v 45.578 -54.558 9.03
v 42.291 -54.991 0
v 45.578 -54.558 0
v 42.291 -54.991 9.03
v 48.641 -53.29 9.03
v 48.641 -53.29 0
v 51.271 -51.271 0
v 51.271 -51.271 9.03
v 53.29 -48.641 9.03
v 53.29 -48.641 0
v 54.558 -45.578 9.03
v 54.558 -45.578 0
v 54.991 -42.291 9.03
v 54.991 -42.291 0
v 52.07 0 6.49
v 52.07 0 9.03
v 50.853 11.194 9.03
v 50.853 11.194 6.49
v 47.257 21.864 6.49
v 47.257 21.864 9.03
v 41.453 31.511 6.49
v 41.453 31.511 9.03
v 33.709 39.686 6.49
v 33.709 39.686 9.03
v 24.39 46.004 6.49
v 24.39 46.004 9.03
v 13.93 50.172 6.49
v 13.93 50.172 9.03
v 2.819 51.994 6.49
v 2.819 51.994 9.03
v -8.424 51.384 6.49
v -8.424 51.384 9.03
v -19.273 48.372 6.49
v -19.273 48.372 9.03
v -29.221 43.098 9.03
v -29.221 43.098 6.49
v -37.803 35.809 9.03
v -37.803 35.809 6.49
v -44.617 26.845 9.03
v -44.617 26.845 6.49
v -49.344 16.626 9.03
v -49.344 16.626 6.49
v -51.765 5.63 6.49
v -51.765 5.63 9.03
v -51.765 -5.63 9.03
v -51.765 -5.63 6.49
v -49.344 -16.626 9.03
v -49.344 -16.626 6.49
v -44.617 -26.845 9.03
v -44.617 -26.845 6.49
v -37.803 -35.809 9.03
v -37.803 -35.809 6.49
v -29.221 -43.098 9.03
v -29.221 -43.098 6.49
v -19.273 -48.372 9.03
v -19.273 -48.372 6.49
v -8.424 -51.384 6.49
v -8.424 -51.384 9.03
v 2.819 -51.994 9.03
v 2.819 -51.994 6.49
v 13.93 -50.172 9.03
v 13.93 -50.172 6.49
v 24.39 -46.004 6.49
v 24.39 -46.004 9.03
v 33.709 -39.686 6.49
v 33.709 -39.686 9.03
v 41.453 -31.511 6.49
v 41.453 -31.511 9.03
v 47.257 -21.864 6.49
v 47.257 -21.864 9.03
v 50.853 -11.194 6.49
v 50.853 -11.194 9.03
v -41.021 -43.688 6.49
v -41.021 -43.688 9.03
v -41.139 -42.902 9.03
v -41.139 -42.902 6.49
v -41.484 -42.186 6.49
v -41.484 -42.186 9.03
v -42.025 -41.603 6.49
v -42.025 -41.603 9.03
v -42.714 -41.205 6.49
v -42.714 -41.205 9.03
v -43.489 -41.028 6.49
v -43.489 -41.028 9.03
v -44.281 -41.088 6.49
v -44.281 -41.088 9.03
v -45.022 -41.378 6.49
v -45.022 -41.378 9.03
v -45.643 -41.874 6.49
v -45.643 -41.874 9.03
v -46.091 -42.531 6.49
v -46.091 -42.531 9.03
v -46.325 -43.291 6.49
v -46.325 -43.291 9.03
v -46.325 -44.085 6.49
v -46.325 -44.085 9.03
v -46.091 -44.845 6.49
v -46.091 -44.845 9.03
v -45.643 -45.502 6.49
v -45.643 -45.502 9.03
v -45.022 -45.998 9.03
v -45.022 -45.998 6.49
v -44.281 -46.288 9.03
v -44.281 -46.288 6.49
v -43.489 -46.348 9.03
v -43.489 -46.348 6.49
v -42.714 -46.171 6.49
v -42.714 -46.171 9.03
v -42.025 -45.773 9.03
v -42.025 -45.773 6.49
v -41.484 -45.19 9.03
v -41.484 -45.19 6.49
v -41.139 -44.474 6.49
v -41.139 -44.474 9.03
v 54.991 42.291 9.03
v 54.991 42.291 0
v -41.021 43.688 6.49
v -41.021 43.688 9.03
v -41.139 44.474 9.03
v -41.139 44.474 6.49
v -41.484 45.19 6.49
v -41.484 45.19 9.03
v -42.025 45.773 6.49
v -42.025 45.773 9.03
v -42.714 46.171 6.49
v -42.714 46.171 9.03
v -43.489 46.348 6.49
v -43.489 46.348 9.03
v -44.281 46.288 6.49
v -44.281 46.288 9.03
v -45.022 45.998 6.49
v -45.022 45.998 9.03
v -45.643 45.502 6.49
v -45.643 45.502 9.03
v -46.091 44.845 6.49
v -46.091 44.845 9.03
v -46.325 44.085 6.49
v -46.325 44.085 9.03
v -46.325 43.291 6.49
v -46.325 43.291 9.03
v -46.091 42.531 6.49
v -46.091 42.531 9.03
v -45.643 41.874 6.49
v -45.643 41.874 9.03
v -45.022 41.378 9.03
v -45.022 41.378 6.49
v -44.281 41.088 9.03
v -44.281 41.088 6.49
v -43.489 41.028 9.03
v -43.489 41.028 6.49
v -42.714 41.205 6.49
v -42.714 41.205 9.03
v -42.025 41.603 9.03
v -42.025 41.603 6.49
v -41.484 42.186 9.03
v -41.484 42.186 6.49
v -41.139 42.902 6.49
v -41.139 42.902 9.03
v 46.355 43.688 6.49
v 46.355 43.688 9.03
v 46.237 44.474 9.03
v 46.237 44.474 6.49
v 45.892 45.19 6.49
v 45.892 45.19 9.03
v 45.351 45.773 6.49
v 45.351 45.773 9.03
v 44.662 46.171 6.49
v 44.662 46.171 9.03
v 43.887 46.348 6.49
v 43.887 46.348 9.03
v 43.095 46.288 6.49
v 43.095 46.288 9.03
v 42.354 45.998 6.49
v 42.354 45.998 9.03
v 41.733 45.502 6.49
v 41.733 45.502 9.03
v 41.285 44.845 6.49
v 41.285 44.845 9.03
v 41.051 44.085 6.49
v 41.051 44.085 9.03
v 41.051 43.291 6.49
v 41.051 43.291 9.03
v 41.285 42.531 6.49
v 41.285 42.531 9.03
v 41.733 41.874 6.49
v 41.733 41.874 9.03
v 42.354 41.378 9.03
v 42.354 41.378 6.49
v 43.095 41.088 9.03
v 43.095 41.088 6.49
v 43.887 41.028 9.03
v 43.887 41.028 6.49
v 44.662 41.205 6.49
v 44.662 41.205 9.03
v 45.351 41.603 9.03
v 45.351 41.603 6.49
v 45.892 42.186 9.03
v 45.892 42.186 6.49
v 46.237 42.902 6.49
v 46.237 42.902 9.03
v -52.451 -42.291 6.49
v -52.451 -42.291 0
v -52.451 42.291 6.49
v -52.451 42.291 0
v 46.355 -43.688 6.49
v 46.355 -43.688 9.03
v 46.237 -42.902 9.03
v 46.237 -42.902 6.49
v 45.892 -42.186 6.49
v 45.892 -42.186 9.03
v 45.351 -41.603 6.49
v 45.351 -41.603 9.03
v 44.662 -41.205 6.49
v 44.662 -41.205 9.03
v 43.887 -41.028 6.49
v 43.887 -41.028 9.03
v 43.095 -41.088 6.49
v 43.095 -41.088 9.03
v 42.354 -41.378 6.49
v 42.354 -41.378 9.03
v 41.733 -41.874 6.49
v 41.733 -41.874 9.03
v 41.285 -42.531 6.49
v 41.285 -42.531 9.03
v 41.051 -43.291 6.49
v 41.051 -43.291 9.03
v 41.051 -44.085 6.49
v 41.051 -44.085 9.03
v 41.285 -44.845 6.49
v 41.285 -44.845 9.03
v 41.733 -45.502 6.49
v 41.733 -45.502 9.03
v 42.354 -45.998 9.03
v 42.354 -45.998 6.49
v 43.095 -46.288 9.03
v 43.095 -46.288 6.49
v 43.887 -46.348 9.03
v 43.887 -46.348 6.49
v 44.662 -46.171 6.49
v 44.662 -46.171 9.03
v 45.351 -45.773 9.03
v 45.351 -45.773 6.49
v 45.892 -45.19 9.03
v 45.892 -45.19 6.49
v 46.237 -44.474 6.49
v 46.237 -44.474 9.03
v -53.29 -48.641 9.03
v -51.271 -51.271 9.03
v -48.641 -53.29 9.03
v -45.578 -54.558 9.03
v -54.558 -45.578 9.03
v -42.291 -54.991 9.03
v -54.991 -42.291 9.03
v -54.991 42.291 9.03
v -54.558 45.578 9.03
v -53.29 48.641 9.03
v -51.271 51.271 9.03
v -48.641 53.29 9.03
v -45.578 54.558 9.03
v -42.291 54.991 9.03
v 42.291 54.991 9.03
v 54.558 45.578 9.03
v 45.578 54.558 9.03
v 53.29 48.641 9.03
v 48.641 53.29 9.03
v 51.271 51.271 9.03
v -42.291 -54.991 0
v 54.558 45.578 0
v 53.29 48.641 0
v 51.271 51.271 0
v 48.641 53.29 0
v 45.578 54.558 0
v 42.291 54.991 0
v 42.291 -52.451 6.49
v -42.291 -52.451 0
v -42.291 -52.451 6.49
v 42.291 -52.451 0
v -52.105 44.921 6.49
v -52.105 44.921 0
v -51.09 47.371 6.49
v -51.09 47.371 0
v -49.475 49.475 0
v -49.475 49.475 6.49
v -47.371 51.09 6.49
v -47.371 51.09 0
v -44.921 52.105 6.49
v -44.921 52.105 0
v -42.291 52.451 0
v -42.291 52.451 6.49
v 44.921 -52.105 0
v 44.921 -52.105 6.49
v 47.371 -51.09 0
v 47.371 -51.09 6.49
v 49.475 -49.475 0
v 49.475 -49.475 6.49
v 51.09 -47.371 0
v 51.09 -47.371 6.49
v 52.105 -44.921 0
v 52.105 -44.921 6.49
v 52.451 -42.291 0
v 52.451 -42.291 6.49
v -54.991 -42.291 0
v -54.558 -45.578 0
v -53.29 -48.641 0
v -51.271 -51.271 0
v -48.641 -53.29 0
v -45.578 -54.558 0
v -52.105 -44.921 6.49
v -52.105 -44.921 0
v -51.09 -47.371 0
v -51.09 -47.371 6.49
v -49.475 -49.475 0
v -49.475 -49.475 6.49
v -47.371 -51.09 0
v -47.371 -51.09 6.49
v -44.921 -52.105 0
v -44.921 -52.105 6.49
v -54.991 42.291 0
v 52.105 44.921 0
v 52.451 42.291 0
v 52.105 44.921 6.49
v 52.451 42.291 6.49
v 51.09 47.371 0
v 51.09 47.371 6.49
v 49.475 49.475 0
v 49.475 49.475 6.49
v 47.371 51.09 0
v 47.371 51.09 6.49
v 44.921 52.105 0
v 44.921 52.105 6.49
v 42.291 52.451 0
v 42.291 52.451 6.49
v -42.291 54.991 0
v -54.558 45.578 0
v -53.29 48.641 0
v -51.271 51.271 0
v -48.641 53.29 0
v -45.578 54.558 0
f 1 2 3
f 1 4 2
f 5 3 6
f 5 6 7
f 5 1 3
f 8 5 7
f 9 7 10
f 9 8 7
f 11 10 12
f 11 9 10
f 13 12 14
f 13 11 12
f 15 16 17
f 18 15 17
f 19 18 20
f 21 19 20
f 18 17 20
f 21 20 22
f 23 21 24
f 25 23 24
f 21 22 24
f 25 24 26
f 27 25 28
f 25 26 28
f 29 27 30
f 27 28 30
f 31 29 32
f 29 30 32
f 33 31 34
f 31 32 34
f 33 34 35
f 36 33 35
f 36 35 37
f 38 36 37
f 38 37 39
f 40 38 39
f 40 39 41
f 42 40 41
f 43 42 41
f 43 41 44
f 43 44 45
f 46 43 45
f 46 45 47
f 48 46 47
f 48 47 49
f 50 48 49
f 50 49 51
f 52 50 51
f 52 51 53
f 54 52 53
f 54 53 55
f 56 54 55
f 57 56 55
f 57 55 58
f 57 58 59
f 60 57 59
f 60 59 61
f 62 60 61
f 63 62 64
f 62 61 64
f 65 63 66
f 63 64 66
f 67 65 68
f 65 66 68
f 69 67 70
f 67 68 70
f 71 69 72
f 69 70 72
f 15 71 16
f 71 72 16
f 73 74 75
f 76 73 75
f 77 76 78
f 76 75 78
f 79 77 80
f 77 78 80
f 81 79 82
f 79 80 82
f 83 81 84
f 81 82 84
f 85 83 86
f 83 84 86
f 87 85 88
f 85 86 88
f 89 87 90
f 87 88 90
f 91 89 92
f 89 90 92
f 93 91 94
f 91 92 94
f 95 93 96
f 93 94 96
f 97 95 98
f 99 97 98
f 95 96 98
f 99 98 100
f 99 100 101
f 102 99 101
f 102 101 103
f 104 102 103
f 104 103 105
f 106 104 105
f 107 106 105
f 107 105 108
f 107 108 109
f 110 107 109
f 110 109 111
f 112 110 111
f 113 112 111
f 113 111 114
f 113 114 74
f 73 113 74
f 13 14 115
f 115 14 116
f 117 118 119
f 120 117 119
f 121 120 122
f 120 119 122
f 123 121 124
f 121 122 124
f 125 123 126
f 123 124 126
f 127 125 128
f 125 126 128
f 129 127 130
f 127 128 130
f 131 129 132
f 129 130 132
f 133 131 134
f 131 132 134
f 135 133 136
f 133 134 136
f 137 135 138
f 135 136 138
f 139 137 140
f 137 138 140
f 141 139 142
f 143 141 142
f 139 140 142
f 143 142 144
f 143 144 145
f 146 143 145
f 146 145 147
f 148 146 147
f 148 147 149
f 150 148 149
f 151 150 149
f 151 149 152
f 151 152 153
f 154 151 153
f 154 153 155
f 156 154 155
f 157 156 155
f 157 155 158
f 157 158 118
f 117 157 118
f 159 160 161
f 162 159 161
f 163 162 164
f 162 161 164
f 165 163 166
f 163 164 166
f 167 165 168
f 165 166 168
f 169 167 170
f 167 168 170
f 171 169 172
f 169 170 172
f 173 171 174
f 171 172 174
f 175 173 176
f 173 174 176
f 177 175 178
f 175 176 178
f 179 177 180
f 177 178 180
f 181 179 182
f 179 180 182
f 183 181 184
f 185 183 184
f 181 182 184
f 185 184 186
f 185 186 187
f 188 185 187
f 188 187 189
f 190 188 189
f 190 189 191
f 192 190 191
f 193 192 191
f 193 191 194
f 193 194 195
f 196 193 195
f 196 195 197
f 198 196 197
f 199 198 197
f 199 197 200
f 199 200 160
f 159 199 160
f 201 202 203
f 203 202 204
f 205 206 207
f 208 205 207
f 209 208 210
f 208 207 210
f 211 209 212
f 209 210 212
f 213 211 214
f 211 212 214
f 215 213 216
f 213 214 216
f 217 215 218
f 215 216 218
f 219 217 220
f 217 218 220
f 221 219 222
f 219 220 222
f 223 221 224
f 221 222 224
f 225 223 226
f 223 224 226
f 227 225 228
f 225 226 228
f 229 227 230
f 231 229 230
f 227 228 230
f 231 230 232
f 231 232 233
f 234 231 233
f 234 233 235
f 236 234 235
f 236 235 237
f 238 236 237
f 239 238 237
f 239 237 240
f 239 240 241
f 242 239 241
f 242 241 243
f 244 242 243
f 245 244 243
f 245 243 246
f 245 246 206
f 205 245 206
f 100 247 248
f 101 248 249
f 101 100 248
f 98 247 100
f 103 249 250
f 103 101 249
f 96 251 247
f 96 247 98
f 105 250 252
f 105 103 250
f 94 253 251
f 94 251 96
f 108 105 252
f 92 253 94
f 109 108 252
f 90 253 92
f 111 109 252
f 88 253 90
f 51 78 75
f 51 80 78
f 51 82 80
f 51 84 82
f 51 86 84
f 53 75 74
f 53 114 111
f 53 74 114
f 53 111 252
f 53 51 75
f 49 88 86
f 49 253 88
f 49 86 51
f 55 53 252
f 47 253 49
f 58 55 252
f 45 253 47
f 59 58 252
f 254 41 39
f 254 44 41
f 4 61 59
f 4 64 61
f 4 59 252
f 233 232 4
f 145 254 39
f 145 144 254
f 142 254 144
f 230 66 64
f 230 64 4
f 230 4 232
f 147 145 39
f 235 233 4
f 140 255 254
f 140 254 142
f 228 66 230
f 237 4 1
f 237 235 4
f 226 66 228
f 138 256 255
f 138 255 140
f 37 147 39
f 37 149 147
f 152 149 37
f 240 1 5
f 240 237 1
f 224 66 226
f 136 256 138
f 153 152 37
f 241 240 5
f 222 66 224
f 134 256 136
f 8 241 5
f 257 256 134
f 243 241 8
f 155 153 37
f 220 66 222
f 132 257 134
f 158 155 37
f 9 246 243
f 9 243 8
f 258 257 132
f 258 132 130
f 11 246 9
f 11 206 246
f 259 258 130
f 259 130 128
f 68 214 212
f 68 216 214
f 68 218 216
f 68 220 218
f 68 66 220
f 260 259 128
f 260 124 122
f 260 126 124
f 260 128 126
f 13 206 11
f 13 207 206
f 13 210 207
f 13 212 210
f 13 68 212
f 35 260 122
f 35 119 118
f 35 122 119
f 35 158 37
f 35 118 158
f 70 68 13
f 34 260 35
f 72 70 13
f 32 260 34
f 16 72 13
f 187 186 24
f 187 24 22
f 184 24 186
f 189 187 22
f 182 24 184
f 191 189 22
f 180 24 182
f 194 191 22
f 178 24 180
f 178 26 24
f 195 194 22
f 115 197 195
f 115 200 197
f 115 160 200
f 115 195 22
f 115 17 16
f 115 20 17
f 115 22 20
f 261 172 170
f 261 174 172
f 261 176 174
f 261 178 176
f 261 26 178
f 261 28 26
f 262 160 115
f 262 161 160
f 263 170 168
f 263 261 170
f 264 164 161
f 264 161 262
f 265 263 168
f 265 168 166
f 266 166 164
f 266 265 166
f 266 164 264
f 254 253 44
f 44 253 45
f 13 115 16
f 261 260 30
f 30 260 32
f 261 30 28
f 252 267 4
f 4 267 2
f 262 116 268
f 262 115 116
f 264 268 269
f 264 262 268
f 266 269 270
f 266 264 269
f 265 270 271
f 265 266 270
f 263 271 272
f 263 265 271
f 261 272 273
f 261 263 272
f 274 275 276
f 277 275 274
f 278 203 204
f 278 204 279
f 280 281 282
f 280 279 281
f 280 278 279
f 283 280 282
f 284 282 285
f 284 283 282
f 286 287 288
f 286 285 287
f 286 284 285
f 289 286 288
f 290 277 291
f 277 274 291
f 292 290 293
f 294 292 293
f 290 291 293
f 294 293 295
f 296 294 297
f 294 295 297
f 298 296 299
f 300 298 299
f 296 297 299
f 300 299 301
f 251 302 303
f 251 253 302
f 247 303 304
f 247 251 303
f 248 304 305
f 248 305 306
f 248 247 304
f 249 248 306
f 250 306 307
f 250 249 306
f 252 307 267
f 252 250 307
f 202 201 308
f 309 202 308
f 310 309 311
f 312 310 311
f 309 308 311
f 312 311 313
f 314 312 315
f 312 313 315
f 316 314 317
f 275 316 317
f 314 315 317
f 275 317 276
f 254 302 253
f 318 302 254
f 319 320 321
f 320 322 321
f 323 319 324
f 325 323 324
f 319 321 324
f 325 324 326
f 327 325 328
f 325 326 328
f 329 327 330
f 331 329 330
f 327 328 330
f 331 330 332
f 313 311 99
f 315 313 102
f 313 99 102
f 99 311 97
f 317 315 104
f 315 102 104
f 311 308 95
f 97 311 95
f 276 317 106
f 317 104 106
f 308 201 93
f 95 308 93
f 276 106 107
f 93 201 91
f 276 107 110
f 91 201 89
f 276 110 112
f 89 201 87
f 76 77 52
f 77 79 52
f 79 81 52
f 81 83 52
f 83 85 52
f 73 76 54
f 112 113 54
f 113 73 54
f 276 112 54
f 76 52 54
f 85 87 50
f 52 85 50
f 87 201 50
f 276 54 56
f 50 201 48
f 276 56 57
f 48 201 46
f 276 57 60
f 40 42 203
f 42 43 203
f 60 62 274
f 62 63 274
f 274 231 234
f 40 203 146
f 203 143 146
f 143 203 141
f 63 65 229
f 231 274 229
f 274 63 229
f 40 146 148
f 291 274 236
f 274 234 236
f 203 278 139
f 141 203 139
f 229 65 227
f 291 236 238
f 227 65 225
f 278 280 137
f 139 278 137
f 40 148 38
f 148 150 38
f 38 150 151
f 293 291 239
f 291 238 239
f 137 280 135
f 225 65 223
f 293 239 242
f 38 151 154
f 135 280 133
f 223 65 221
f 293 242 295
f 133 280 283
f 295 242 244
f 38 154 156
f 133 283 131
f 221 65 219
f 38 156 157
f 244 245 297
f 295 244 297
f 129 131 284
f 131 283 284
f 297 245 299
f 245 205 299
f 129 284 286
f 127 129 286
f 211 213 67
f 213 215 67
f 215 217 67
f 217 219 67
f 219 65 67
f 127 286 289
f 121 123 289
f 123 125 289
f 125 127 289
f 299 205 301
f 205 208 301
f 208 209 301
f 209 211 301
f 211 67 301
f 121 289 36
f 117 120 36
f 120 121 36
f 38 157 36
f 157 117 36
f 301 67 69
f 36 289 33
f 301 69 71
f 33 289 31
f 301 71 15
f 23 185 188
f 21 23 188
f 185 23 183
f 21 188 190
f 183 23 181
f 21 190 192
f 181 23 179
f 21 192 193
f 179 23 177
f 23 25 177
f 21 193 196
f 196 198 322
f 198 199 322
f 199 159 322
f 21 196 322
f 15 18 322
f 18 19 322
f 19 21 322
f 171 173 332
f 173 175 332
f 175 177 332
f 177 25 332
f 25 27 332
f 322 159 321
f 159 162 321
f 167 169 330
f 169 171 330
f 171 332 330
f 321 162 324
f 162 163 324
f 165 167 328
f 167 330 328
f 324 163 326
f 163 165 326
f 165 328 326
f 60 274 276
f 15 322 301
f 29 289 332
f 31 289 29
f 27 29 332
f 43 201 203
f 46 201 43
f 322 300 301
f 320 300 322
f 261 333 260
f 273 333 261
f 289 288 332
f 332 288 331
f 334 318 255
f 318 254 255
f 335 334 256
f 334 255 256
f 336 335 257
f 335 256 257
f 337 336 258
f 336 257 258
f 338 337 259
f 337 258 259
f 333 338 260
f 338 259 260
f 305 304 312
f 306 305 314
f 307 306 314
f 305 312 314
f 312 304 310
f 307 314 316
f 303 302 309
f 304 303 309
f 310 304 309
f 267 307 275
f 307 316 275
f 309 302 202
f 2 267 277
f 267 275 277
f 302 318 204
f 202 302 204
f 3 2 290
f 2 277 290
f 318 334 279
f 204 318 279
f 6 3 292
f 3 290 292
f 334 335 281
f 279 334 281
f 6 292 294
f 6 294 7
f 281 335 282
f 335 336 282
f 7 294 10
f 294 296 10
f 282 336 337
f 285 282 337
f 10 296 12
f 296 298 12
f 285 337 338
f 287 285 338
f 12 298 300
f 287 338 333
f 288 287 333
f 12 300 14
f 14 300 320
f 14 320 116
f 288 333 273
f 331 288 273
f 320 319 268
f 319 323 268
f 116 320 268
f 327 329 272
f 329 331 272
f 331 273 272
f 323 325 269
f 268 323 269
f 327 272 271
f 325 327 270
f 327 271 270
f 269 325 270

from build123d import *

# Parameters (mm, degrees)
SKETCH1_W           = 109.982
SKETCH1_H           = 109.982
BOSS_EXTRUDE1_DEPTH = 9.0297
FILLET1_R           = 12.7
SHELL1_T            = -2.54
SKETCH2_R           = 52.07
SKETCH2_R_2         = 2.667
CUT_EXTRUDE1_DEPTH  = 79.291478745


with BuildPart() as part:
    # Sketch1 → Boss-Extrude1 (new body)
    with BuildSketch(Plane.XY):
        Rectangle(SKETCH1_W, SKETCH1_H)
    extrude(amount=BOSS_EXTRUDE1_DEPTH)

    # Fillet1
    fillet1_edges = [part.edges().sort_by_distance(p)[0] for p in [
        (54.991, -54.991, 4.51485),
        (-54.991, -54.991, 4.51485),
        (-54.991, 54.991, 4.51485),
        (54.991, 54.991, 4.51485),
    ]]
    fillet(fillet1_edges, radius=FILLET1_R)

    # Shell1
    shell1_openings = [part.faces().sort_by_distance(p)[0] for p in [
        (0, 0, 0),
    ]]
    offset(amount=SHELL1_T, openings=shell1_openings, kind=Kind.INTERSECTION)

    # Sketch2 → Cut-Extrude1 (cut, through all)
    with BuildSketch(Plane.XY.offset(9.0297)):
        Circle(SKETCH2_R)
        with Locations((43.688, 43.688)):
            Circle(SKETCH2_R_2)
        with Locations((-43.688, 43.688)):
            Circle(SKETCH2_R_2)
        with Locations((-43.688, -43.688)):
            Circle(SKETCH2_R_2)
        with Locations((43.688, -43.688)):
            Circle(SKETCH2_R_2)
    extrude(amount=-CUT_EXTRUDE1_DEPTH, mode=Mode.SUBTRACT)


solid = part.part
